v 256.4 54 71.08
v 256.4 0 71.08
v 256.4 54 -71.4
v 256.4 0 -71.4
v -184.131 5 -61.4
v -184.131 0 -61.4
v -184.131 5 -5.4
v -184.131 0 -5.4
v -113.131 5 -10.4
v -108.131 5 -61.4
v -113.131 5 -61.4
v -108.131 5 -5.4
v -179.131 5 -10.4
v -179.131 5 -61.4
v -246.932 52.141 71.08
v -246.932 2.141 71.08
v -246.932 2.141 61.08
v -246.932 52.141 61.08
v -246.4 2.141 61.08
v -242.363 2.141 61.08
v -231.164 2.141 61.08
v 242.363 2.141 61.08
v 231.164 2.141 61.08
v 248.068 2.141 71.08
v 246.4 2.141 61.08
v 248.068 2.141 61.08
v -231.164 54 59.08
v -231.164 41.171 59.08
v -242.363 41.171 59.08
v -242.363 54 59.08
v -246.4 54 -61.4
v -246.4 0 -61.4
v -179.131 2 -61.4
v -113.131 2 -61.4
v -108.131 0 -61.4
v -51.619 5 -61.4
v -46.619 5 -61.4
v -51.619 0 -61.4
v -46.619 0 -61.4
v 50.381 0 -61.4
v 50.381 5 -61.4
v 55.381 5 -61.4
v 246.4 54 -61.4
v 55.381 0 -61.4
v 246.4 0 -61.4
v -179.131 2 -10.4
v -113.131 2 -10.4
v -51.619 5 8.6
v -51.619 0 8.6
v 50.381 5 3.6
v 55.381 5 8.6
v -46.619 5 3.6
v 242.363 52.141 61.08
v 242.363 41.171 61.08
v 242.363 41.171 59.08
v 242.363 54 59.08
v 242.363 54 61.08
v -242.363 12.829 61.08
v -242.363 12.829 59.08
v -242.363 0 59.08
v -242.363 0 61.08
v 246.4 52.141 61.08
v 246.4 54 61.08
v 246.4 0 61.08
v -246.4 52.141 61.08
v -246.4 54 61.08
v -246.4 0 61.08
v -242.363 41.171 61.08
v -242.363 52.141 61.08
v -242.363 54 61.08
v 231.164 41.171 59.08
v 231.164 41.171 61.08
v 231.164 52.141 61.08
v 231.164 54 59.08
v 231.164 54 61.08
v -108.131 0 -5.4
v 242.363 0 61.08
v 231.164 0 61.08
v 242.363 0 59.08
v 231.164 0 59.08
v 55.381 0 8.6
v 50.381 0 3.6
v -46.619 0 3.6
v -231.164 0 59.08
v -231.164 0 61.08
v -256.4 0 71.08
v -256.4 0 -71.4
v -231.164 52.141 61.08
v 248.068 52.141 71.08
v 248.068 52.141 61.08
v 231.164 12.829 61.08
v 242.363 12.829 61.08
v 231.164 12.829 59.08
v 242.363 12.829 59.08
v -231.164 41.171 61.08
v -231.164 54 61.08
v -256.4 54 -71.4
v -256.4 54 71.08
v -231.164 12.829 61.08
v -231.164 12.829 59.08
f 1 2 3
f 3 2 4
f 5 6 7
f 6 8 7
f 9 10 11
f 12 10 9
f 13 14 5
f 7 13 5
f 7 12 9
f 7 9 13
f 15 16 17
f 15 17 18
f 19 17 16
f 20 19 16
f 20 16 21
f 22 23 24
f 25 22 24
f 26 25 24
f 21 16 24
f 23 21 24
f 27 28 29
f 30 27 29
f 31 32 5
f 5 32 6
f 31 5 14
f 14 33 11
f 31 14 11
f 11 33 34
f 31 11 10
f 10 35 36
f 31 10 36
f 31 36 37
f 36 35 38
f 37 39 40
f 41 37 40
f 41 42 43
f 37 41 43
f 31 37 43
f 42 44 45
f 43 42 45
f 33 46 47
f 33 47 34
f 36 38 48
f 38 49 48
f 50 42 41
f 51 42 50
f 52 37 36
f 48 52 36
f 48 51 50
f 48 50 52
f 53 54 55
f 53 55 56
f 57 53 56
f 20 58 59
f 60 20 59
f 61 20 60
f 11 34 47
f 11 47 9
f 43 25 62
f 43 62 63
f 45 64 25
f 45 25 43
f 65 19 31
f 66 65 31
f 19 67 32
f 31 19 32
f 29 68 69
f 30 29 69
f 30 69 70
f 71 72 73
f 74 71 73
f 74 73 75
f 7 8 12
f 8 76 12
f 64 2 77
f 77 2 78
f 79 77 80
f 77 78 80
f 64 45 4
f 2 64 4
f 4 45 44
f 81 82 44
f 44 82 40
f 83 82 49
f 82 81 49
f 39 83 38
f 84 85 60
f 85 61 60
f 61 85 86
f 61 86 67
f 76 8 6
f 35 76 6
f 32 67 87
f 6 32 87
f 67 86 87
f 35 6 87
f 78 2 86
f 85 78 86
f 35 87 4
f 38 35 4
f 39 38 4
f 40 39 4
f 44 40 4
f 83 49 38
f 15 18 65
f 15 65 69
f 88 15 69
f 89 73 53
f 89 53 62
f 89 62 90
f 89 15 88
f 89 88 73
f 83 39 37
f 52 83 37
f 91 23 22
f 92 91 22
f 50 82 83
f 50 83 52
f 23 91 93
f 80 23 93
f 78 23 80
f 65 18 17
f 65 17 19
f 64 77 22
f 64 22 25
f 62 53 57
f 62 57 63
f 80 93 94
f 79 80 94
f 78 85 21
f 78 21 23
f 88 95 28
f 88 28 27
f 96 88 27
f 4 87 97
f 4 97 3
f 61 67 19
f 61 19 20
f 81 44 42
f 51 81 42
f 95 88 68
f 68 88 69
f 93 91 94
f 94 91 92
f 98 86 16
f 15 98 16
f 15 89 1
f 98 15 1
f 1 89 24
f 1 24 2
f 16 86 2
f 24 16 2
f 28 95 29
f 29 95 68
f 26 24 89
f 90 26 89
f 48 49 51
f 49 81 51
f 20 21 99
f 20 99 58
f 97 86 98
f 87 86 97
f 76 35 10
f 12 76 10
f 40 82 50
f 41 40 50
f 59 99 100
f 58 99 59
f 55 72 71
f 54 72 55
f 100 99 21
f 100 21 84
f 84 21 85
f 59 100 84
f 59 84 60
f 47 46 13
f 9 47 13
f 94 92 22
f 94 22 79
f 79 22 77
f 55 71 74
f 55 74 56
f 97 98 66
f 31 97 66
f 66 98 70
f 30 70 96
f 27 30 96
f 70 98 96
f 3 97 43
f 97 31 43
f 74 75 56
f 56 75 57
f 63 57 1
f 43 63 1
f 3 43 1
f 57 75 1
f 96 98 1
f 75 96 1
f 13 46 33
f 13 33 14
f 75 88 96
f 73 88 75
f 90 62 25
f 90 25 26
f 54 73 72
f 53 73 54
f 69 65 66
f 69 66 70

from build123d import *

# Parameters (mm, degrees)
SKETCH2_W               = 512.8
SKETCH2_H               = 142.48
SKETCH2_W_2             = 492.8
SKETCH2_H_2             = 122.48
EXTRUDE_THIN1_DEPTH     = 54
SKETCH3_W               = 495
SKETCH3_H               = 50
CUT_EXTRUDE1_DEPTH      = 10
SKETCH4_W               = 11.198987657
SKETCH4_H               = 12.828632872
BOSS_EXTRUDE1_DEPTH     = 2
MIRROR3_COPY_1_SKETCH_W = 11.198987657
MIRROR3_COPY_1_SKETCH_H = 12.828632872
MIRROR3_COPY_1_DEPTH    = 2
MIRROR3_COPY_2_SKETCH_W = 11.198987657
MIRROR3_COPY_2_SKETCH_H = 12.828632872
MIRROR3_COPY_2_DEPTH    = 2
SKETCH5_W               = 5
SKETCH5_H               = 5
BOSS_EXTRUDE2_DEPTH     = 70
SKETCH7_W               = 5
SKETCH7_H               = 5
BOSS_EXTRUDE3_DEPTH     = 102
SKETCH8_W               = 5
SKETCH8_H               = 5
BOSS_EXTRUDE4_DEPTH     = 65
SKETCH9_W               = 5
SKETCH9_H               = 5
BOSS_EXTRUDE5_DEPTH     = 56
SKETCH10_W              = 5
SKETCH10_H              = 5
BOSS_EXTRUDE6_DEPTH     = 71
SKETCH11_W              = 5
SKETCH11_H              = 5
BOSS_EXTRUDE7_DEPTH     = 51
SKETCH14_W              = 51
SKETCH14_H              = 2
BOSS_EXTRUDE8_DEPTH     = 66


with BuildPart() as part:
    # Sketch2 → Extrude-Thin1 (new body)
    with BuildSketch(Plane(origin=(0, 0, 0), x_dir=(1, 0, 0), z_dir=(0, 1, 0))):
        with Locations((0, 0.16)):
            Rectangle(SKETCH2_W, SKETCH2_H)
        with Locations((0, 0.16)):
            Rectangle(SKETCH2_W_2, SKETCH2_H_2, mode=Mode.SUBTRACT)
    extrude(amount=EXTRUDE_THIN1_DEPTH)

    # Sketch3 → Cut-Extrude1 (cut)
    with BuildSketch(Plane.XY.offset(71.08)):
        with Locations((0.567740689, 27.1414334)):
            Rectangle(SKETCH3_W, SKETCH3_H)
    extrude(amount=-CUT_EXTRUDE1_DEPTH, mode=Mode.SUBTRACT)

    # Sketch4 → Boss-Extrude1 (add)
    with BuildSketch(Plane(origin=(0, 0, 61.08), x_dir=(-1, 0, 0), z_dir=(0, 0, -1))):
        with Locations((236.763190304, 47.585683564)):
            Rectangle(SKETCH4_W, SKETCH4_H)
    boss_extrude1 = extrude(amount=BOSS_EXTRUDE1_DEPTH)

    # Mirror1: Boss-Extrude1 across plane
    add(boss_extrude1.mirror(Plane(origin=(0, 0, 0), x_dir=(0, 0, 1), z_dir=(1, 0, 0))))

    # Mirror2: Boss-Extrude1 across plane
    add(boss_extrude1.mirror(Plane.ZX.offset(27)))

    # Mirror3 copy 1 sketch → Mirror3 copy 1 (add)
    with BuildSketch(Plane(origin=(0, 54, 61.08), x_dir=(1, 0, 0), z_dir=(0, 0, -1))):
        with Locations((236.763190304, 47.585683564)):
            Rectangle(MIRROR3_COPY_1_SKETCH_W, MIRROR3_COPY_1_SKETCH_H)
    extrude(amount=MIRROR3_COPY_1_DEPTH)

    # Mirror3 copy 2 sketch → Mirror3 copy 2 (add)
    with BuildSketch(Plane(origin=(0, 54, 61.08), x_dir=(-1, 0, 0), z_dir=(0, 0, -1))):
        with Locations((236.763190304, -47.585683564)):
            Rectangle(MIRROR3_COPY_2_SKETCH_W, MIRROR3_COPY_2_SKETCH_H)
    extrude(amount=MIRROR3_COPY_2_DEPTH)

    # Sketch5 → Boss-Extrude2 (add)
    with BuildSketch(Plane.XY.offset(-61.4)):
        with Locations((52.881030247, 2.5)):
            Rectangle(SKETCH5_W, SKETCH5_H)
    extrude(amount=BOSS_EXTRUDE2_DEPTH)

    # Sketch7 → Boss-Extrude3 (add)
    with BuildSketch(Plane.ZY.offset(-50.381030247)):
        with Locations((6.1, 2.5)):
            Rectangle(SKETCH7_W, SKETCH7_H)
    extrude(amount=BOSS_EXTRUDE3_DEPTH)

    # Sketch8 → Boss-Extrude4 (add)
    with BuildSketch(Plane(origin=(0, 0, 3.6), x_dir=(-1, 0, 0), z_dir=(0, 0, -1))):
        with Locations((49.118969753, 2.5)):
            Rectangle(SKETCH8_W, SKETCH8_H)
    extrude(amount=BOSS_EXTRUDE4_DEPTH)

    # Sketch9 → Boss-Extrude5 (add)
    with BuildSketch(Plane.XY.offset(-61.4)):
        with Locations((-110.630872861, 2.5)):
            Rectangle(SKETCH9_W, SKETCH9_H)
    extrude(amount=BOSS_EXTRUDE5_DEPTH)

    # Sketch10 → Boss-Extrude6 (add)
    with BuildSketch(Plane.ZY.offset(113.130872861)):
        with Locations((-7.9, 2.5)):
            Rectangle(SKETCH10_W, SKETCH10_H)
    extrude(amount=BOSS_EXTRUDE6_DEPTH)

    # Sketch11 → Boss-Extrude7 (add)
    with BuildSketch(Plane(origin=(0, 0, -10.4), x_dir=(-1, 0, 0), z_dir=(0, 0, -1))):
        with Locations((181.630872861, 2.5)):
            Rectangle(SKETCH11_W, SKETCH11_H)
    extrude(amount=BOSS_EXTRUDE7_DEPTH)

    # Sketch14 → Boss-Extrude8 (add)
    with BuildSketch(Plane(origin=(-179.130872861, 0, 0), x_dir=(0, 0, -1), z_dir=(1, 0, 0))):
        with Locations((35.9, 1)):
            Rectangle(SKETCH14_W, SKETCH14_H)
    extrude(amount=BOSS_EXTRUDE8_DEPTH)


solid = part.part
